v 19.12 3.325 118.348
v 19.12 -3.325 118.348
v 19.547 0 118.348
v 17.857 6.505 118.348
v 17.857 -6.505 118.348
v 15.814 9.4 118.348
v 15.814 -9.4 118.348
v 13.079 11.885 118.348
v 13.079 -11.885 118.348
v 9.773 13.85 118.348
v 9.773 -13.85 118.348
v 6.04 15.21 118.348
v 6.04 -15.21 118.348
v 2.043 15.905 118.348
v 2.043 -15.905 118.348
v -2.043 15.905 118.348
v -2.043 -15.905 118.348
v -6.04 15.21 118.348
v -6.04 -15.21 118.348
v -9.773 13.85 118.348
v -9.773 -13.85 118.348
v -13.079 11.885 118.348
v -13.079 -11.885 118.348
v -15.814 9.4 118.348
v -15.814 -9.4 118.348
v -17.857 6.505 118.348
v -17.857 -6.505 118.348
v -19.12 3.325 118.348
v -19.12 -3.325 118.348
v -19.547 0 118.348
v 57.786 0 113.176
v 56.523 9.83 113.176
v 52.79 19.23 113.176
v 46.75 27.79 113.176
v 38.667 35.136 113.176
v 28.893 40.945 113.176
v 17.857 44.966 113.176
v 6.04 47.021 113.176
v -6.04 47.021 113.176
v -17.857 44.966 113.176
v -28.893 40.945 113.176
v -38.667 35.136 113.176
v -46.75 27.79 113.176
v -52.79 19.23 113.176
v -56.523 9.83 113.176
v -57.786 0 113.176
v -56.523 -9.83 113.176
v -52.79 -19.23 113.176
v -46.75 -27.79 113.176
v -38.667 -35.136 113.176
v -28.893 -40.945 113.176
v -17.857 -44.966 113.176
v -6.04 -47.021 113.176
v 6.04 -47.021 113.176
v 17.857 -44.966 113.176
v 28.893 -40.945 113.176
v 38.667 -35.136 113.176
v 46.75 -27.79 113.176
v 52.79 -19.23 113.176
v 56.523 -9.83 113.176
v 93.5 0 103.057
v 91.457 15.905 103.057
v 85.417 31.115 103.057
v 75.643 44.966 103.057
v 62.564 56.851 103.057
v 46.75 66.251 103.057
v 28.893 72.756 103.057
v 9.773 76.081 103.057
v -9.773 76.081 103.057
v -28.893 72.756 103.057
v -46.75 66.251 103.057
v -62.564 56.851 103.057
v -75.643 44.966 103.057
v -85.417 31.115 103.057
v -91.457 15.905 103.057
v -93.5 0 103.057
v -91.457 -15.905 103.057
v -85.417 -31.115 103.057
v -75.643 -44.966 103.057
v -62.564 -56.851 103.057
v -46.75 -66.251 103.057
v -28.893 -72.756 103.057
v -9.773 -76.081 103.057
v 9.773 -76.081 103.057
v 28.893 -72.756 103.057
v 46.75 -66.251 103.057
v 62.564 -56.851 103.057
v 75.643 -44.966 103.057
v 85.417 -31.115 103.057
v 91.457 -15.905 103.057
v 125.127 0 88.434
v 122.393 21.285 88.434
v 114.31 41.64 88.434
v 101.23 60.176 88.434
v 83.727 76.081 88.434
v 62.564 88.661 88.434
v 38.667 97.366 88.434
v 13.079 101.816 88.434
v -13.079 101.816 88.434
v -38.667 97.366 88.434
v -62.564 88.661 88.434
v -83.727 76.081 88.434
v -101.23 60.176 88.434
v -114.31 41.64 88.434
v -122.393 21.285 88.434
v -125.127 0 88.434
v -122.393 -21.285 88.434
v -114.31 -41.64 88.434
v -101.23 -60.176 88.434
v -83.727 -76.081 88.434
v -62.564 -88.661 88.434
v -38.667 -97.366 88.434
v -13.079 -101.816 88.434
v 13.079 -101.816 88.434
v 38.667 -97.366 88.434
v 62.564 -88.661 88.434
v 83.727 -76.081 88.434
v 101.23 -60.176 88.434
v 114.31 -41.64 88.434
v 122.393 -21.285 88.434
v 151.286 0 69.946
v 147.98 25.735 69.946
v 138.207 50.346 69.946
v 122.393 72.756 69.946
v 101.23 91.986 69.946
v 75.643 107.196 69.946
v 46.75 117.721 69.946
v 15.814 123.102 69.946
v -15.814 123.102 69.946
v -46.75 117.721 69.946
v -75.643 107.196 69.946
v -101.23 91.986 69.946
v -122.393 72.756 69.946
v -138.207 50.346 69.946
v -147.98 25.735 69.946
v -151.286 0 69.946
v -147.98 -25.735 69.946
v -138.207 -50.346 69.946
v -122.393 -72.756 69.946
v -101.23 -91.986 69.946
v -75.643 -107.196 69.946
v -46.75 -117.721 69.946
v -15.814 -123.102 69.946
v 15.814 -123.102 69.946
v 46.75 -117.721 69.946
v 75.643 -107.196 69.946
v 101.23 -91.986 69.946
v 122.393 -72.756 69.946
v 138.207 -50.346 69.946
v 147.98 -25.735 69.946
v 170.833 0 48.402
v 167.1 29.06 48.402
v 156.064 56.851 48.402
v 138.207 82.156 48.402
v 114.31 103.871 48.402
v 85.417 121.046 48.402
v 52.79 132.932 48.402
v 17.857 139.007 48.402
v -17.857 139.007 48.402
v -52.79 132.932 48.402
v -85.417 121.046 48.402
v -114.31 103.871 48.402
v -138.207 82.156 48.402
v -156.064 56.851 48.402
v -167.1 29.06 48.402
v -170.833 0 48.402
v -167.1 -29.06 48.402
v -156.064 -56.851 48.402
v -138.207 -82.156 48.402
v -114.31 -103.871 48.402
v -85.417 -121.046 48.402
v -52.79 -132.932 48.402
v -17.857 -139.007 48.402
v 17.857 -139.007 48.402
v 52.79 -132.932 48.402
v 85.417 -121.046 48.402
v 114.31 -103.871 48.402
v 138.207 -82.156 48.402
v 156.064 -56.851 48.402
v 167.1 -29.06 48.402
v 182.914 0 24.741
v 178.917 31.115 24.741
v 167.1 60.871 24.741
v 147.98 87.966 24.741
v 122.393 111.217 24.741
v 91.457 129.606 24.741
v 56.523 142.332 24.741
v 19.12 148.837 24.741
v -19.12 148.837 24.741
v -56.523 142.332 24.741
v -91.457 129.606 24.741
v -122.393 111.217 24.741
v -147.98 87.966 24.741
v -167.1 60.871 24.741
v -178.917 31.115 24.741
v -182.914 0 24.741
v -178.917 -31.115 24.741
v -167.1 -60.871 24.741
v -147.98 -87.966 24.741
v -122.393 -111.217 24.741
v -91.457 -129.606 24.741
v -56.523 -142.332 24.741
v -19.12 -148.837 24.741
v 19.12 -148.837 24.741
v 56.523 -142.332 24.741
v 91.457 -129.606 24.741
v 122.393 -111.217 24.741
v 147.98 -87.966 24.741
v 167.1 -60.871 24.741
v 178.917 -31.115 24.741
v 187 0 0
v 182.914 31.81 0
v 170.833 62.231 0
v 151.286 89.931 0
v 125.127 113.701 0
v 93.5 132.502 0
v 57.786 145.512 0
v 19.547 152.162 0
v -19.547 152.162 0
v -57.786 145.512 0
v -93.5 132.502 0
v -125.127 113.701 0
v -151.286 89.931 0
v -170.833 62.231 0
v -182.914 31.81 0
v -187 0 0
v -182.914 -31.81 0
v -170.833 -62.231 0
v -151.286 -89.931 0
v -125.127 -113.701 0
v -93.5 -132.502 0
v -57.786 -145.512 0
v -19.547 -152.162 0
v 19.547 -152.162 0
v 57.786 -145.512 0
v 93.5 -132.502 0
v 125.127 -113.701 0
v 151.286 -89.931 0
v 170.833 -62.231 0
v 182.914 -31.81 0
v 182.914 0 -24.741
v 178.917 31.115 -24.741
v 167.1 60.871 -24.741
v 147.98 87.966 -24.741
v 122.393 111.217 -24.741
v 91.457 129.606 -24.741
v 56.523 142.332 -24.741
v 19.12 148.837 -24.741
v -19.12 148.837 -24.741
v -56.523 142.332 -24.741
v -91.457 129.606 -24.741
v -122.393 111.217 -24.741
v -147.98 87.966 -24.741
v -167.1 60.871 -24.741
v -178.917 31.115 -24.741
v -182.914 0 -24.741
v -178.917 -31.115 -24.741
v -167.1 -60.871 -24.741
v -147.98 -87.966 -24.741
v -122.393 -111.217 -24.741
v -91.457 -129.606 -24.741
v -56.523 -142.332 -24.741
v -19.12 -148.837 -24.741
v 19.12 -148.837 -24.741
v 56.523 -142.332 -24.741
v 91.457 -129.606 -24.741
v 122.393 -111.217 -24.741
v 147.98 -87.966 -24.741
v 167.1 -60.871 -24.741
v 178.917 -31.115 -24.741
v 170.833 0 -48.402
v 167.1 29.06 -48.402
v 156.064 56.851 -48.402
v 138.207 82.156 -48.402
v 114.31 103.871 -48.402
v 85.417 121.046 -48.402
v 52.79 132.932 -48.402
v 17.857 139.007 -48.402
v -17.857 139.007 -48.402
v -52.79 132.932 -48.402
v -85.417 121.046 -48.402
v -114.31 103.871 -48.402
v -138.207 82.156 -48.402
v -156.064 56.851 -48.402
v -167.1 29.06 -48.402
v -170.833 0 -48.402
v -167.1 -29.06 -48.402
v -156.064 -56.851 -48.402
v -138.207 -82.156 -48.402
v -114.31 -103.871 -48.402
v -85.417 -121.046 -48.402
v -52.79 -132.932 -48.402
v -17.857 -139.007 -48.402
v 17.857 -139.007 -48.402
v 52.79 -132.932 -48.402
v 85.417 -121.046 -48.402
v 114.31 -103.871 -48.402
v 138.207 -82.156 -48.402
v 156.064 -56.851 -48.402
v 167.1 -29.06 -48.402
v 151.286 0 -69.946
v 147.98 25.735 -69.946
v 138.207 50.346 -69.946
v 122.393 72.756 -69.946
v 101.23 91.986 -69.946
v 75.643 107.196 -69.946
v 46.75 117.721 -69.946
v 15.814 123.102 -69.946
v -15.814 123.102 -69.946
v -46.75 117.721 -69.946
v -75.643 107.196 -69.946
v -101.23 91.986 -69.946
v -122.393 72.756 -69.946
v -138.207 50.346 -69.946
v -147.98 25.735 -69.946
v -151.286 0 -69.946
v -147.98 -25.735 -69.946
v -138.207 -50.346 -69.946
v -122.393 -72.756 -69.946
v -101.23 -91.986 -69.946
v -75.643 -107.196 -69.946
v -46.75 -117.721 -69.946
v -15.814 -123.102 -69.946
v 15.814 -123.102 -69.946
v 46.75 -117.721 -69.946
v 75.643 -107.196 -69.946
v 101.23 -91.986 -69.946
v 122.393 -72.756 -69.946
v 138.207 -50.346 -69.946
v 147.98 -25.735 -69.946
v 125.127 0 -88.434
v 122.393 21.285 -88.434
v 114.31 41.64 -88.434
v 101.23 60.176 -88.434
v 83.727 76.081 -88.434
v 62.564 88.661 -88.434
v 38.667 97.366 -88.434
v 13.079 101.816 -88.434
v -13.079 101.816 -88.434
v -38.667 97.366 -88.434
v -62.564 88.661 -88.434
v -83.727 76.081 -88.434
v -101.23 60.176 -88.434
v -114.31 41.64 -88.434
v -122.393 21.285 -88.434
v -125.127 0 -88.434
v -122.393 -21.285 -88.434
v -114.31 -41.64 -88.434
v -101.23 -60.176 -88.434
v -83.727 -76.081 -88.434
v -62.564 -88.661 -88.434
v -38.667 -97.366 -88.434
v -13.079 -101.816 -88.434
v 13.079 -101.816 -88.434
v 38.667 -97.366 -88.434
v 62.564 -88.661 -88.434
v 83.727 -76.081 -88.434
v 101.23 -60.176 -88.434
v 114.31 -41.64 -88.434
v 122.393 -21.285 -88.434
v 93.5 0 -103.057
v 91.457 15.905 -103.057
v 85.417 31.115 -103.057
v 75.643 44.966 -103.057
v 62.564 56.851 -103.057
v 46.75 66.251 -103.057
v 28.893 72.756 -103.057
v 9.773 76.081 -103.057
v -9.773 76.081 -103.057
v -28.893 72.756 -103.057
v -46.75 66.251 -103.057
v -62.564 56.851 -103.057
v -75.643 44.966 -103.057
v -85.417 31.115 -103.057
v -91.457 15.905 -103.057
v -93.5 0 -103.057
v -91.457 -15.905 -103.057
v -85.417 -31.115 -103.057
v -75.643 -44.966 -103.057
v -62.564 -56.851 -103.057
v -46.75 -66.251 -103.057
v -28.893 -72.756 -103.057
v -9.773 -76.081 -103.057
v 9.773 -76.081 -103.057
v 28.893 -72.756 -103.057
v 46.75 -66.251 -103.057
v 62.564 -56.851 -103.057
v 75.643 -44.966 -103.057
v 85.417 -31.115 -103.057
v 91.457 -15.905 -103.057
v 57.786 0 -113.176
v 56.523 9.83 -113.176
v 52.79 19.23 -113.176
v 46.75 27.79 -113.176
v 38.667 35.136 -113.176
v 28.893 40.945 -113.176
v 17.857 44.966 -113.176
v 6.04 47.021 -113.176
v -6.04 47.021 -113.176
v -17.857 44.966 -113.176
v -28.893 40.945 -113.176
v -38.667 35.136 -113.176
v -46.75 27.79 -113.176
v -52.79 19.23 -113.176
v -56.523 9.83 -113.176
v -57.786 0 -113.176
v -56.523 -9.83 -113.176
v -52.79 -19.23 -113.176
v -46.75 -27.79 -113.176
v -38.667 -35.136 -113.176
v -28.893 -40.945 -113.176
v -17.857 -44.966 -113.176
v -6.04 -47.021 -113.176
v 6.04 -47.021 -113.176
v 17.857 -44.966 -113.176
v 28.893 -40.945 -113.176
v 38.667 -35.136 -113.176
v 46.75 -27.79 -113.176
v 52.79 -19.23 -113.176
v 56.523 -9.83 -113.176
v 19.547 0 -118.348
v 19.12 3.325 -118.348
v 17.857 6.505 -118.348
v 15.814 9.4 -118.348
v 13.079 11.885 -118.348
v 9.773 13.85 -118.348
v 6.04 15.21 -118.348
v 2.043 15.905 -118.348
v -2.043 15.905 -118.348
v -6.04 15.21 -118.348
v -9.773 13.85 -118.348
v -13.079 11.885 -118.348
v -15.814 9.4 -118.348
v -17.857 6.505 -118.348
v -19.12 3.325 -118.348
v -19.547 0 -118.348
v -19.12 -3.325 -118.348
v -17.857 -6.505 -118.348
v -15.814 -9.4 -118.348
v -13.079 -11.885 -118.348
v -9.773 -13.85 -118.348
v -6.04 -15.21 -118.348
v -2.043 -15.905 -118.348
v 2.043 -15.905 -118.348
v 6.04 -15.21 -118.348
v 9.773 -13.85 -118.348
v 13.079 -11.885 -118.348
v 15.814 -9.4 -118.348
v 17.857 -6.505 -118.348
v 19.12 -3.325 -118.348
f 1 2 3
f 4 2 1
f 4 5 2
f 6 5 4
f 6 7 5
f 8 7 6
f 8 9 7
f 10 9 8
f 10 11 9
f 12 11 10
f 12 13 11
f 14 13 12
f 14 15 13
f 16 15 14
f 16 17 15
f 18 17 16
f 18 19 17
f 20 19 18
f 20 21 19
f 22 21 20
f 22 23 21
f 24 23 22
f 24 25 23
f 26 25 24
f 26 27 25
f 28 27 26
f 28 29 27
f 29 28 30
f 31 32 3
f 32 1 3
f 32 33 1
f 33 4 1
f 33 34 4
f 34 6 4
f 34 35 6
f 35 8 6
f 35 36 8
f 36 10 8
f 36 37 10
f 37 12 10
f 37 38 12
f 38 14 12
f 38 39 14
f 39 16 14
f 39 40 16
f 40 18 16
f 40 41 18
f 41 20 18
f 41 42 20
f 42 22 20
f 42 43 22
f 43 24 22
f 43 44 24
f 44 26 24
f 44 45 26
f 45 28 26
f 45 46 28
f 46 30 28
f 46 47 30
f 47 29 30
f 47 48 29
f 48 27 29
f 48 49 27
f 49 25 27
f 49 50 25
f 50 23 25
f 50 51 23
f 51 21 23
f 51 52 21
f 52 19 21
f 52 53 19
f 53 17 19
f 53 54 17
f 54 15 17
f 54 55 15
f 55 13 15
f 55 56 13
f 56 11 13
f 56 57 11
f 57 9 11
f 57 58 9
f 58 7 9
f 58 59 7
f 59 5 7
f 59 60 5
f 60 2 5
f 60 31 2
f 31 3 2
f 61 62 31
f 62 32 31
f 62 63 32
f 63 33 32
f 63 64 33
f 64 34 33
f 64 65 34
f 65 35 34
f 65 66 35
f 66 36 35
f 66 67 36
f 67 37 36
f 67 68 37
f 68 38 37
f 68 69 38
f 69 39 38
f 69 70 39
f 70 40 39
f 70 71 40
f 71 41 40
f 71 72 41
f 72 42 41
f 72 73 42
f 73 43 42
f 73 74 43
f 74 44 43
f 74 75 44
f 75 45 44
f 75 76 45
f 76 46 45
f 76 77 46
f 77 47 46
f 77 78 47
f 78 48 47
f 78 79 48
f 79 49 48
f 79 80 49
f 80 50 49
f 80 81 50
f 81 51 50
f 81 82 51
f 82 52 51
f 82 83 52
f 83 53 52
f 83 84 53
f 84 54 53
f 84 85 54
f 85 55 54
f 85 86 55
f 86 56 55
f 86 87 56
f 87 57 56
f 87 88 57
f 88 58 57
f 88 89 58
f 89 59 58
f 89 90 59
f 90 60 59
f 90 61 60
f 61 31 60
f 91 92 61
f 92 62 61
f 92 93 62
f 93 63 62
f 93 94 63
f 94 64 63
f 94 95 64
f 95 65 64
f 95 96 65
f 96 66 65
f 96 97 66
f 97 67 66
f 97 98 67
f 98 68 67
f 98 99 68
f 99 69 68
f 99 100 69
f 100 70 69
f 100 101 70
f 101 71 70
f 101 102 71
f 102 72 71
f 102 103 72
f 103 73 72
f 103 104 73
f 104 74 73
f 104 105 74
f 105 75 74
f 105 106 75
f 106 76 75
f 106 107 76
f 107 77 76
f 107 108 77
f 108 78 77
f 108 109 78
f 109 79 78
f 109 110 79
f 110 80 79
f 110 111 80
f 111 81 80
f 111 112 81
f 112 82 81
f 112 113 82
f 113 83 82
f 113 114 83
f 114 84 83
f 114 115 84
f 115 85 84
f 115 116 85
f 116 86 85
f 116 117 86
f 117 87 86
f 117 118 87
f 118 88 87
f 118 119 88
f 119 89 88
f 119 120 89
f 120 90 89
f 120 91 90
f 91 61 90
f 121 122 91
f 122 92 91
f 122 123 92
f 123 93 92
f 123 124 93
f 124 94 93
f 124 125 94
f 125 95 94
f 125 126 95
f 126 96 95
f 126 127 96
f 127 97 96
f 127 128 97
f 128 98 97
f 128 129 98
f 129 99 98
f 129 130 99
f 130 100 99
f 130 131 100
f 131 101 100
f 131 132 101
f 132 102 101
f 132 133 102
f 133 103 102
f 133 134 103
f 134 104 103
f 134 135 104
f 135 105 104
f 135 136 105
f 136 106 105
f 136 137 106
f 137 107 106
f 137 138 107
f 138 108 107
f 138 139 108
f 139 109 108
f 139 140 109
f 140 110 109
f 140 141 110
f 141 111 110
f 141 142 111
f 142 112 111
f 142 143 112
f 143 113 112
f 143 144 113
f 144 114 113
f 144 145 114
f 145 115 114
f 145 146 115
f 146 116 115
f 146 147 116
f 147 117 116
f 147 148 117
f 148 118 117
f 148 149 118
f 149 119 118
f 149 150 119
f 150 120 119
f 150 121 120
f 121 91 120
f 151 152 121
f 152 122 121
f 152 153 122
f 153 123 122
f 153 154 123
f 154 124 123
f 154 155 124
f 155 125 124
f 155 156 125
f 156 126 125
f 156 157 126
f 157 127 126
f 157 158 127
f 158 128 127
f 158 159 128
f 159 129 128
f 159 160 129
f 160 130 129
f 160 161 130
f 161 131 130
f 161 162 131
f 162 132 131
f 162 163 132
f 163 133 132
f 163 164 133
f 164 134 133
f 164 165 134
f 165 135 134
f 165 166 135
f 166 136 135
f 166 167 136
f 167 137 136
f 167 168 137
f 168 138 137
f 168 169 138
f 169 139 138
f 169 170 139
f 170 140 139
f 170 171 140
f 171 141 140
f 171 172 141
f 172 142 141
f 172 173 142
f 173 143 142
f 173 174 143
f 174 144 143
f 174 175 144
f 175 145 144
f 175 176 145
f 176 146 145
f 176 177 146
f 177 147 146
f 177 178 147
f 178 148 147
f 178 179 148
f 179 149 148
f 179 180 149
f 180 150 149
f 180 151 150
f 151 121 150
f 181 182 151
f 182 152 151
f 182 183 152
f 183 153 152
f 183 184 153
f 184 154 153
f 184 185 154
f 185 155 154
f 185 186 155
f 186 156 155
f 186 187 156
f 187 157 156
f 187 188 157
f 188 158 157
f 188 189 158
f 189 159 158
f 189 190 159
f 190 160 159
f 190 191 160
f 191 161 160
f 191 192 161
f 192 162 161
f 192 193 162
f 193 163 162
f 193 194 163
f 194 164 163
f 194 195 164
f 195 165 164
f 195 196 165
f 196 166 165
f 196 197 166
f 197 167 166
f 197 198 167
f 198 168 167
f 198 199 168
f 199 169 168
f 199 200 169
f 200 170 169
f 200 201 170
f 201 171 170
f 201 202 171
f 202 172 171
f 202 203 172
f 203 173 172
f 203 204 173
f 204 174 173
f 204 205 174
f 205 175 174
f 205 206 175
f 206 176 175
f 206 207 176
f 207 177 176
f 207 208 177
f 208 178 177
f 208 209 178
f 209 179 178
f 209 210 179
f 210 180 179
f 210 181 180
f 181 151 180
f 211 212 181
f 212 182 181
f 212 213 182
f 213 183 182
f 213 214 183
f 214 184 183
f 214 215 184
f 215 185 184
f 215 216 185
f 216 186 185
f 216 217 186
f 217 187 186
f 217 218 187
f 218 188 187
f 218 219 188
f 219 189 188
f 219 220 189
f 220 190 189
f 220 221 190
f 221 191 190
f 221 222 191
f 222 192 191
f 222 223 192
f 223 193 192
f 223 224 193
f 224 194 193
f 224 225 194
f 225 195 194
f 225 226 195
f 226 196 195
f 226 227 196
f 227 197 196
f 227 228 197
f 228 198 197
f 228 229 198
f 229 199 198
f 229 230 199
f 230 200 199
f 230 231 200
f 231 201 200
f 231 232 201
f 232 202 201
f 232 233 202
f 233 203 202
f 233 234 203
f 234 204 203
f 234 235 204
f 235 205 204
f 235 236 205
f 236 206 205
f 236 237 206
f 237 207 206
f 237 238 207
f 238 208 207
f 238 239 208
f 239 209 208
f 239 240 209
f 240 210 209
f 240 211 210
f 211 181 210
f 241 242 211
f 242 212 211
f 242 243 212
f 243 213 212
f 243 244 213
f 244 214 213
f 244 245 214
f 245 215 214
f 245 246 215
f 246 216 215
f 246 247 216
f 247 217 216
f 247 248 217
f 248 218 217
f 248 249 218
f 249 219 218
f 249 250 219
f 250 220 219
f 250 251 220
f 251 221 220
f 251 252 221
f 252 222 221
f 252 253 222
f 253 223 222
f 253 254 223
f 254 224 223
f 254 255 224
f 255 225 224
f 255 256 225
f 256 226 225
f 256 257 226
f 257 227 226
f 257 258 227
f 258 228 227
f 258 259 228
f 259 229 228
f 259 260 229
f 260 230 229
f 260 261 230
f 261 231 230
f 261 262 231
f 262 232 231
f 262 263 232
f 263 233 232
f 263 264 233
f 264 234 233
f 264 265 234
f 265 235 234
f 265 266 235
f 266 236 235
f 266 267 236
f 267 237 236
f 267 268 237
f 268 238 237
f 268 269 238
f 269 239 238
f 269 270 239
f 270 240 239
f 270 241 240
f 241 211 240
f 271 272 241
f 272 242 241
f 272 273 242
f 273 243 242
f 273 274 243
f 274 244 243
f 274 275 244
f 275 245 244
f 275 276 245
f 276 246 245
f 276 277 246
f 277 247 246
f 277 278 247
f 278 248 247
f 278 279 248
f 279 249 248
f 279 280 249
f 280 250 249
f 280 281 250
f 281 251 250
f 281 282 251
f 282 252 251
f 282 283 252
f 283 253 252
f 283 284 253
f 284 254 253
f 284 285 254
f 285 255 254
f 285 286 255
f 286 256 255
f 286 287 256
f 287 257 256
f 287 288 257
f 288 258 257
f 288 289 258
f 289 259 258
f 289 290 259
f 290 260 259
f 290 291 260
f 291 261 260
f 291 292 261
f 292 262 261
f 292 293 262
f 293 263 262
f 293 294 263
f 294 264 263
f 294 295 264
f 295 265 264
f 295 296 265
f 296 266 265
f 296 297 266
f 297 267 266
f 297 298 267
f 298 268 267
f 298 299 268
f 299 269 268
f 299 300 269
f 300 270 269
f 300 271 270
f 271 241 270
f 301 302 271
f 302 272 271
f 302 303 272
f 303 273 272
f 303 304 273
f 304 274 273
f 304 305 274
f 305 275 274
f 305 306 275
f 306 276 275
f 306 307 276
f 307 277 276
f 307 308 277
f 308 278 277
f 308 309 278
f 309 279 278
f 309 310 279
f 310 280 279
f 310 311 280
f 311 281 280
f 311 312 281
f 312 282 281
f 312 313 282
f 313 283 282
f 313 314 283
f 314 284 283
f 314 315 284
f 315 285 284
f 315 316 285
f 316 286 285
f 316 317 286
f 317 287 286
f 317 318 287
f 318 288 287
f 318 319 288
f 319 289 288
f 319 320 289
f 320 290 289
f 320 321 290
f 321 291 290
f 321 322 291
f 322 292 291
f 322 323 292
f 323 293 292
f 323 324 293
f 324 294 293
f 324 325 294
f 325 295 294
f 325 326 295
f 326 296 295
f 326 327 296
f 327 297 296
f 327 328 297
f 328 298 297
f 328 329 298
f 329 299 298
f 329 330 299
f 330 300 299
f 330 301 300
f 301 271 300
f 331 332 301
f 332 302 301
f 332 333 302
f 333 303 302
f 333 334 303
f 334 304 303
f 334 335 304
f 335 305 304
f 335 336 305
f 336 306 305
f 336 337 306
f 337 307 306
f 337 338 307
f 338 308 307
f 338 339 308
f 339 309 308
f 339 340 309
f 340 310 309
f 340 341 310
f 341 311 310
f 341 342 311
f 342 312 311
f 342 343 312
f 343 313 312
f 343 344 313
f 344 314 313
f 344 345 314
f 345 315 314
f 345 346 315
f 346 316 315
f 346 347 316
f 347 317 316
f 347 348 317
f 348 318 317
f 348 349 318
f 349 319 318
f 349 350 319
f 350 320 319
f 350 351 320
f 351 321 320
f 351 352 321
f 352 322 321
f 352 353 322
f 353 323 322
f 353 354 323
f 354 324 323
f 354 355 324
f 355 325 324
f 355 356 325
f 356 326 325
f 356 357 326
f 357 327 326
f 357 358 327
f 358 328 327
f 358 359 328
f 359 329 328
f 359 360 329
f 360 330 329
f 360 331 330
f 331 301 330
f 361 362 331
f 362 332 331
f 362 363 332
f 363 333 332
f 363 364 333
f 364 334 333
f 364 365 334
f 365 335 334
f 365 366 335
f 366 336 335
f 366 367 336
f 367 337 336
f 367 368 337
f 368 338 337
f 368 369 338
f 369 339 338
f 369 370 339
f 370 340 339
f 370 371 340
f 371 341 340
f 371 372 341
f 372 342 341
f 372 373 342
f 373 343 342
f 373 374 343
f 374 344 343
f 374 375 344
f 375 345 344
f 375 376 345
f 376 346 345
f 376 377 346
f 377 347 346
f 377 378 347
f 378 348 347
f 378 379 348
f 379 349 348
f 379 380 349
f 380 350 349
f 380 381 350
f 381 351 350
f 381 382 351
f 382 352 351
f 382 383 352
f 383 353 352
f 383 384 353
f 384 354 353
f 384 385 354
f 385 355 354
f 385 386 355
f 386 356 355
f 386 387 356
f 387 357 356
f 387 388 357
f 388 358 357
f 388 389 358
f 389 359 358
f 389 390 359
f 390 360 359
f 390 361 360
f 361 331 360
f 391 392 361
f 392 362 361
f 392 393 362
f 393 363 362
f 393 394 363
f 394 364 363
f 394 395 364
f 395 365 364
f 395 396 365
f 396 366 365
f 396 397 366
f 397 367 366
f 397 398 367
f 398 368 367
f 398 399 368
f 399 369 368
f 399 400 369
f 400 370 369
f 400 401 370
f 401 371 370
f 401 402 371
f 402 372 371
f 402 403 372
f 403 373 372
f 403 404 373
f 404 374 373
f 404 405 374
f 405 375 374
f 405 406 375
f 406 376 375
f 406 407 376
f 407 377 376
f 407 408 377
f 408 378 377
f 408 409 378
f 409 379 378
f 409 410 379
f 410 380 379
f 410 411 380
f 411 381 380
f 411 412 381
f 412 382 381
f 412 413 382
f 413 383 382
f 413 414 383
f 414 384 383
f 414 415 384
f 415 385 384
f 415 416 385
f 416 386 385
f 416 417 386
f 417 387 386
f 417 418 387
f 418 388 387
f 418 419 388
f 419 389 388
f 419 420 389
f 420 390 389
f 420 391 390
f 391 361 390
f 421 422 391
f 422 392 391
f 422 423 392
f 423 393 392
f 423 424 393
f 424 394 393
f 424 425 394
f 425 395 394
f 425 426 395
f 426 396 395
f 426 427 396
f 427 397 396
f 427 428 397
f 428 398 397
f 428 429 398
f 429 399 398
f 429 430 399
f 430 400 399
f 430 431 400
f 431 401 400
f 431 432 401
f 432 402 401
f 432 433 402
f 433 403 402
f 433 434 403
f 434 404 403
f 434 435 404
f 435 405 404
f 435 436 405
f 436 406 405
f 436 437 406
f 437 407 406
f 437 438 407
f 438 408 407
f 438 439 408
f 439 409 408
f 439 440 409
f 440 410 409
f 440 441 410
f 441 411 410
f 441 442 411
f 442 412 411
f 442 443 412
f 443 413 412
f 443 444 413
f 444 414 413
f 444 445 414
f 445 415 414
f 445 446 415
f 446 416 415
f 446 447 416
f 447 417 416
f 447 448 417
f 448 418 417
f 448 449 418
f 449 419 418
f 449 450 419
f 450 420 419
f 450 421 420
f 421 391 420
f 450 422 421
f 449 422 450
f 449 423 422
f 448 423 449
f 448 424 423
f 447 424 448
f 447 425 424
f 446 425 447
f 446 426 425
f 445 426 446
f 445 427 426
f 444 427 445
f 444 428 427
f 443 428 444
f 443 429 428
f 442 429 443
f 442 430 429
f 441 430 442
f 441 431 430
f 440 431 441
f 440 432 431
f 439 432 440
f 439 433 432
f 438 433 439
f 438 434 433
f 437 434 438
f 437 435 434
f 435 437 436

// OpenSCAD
// Generated by SolidPython 1.0.1 on 2020-07-29 00:46:49


scale(v = [11, 9, 7]) {
	sphere(r = 17);
}
/***********************************************
*********      SolidPython code:      **********
************************************************
 
# import packages: SolidPython
from solid import *
from solid.utils import *
from itertools import chain, combinations, permutations


class Resize:

    def __init__(self, scad_file):
        self.scad_file = scad_file
        #self.scad_file = import_scad(scad_file)
        # cone/cylinder param:
        self.r1 = 0
        self.r2 = 0
        self.h = 0
        # rectangular prism param:
        self.w = 0
        self.l = 0
        # ellipse param:
        self.r = 0

    # import OpenScad code (file name corresponds to shape)


    # classify shape + parameters
    def assign(self, param1, param2, param3):
        if self.scad_file == 'cone.scad':
            self.r1 = param1
            self.r2 = param2
            self.h = param3
        elif self.scad_file == 'cylinder.scad':
            self.r1 = param1
            self.r2 = param2
            self.h = param3
        elif self.scad_file == 'rectangularPrism.scad':
            self.h = param1
            self.l = param2
            self.w = param3
        else:
            self.r = param1
            self.h = param2

    # resize parameters
    def iterate(self):
        x = range(3, 20, 2)
        i = 1
        if self.scad_file == 'cone.scad':
            tempList = list(permutations(x, 2))
            for temp in tempList:
                param1 = temp[0]
                param2 = temp[1]
                filepath = 'produced_scad_files/' + 'cone' + str(param1) + '_' + str(param2) + '_' + '.scad'
                scad_render_to_file(cylinder(h=param1, r1=param2, r2=0), filepath)

        elif self.scad_file == 'cylinder.scad':
            tempList = list(permutations(x, 3))
            for temp in tempList:
                param1 = temp[0]
                param2 = temp[1]
                filepath = 'produced_scad_files/' + 'cylinder' + str(param1) + '_' + str(param2) + '_' + '.scad'
                scad_render_to_file(cylinder(h=param1, r1=param2, r2=param2), filepath)

        elif self.scad_file == 'rectangularPrism.scad':
            tempList = list(permutations(x, 3))
            for temp in tempList:
                param1 = temp[0]
                param2 = temp[1]
                param3 = temp[2]
                filepath = 'produced_scad_files/' + 'rectangularPrism' + str(param1) + '_' + str(param2) + '_' + str(
                    param3) + '.scad'
                scad_render_to_file(cube(size=(param1, param2, param3)), filepath)

        elif self.scad_file == 'ellipse.scad':
            tempList = list(permutations(x, 4))
            for temp in tempList:
                param1 = temp[0]
                param2 = temp[1]
                param3 = temp[2]
                param4 = temp[3]
                filepath = 'produced_scad_files/' + 'ellipse' + str(param1) + '_' + str(param2) + '_' + str(param3) + '_' + str(param4) + '.scad'
                scad_render_to_file(scale([param1, param2, param3])(sphere(r=param4)), filepath)

    def render_to_scadfile(self):
        scad_render_to_file(scad, 'example.scad') 
 
************************************************/
